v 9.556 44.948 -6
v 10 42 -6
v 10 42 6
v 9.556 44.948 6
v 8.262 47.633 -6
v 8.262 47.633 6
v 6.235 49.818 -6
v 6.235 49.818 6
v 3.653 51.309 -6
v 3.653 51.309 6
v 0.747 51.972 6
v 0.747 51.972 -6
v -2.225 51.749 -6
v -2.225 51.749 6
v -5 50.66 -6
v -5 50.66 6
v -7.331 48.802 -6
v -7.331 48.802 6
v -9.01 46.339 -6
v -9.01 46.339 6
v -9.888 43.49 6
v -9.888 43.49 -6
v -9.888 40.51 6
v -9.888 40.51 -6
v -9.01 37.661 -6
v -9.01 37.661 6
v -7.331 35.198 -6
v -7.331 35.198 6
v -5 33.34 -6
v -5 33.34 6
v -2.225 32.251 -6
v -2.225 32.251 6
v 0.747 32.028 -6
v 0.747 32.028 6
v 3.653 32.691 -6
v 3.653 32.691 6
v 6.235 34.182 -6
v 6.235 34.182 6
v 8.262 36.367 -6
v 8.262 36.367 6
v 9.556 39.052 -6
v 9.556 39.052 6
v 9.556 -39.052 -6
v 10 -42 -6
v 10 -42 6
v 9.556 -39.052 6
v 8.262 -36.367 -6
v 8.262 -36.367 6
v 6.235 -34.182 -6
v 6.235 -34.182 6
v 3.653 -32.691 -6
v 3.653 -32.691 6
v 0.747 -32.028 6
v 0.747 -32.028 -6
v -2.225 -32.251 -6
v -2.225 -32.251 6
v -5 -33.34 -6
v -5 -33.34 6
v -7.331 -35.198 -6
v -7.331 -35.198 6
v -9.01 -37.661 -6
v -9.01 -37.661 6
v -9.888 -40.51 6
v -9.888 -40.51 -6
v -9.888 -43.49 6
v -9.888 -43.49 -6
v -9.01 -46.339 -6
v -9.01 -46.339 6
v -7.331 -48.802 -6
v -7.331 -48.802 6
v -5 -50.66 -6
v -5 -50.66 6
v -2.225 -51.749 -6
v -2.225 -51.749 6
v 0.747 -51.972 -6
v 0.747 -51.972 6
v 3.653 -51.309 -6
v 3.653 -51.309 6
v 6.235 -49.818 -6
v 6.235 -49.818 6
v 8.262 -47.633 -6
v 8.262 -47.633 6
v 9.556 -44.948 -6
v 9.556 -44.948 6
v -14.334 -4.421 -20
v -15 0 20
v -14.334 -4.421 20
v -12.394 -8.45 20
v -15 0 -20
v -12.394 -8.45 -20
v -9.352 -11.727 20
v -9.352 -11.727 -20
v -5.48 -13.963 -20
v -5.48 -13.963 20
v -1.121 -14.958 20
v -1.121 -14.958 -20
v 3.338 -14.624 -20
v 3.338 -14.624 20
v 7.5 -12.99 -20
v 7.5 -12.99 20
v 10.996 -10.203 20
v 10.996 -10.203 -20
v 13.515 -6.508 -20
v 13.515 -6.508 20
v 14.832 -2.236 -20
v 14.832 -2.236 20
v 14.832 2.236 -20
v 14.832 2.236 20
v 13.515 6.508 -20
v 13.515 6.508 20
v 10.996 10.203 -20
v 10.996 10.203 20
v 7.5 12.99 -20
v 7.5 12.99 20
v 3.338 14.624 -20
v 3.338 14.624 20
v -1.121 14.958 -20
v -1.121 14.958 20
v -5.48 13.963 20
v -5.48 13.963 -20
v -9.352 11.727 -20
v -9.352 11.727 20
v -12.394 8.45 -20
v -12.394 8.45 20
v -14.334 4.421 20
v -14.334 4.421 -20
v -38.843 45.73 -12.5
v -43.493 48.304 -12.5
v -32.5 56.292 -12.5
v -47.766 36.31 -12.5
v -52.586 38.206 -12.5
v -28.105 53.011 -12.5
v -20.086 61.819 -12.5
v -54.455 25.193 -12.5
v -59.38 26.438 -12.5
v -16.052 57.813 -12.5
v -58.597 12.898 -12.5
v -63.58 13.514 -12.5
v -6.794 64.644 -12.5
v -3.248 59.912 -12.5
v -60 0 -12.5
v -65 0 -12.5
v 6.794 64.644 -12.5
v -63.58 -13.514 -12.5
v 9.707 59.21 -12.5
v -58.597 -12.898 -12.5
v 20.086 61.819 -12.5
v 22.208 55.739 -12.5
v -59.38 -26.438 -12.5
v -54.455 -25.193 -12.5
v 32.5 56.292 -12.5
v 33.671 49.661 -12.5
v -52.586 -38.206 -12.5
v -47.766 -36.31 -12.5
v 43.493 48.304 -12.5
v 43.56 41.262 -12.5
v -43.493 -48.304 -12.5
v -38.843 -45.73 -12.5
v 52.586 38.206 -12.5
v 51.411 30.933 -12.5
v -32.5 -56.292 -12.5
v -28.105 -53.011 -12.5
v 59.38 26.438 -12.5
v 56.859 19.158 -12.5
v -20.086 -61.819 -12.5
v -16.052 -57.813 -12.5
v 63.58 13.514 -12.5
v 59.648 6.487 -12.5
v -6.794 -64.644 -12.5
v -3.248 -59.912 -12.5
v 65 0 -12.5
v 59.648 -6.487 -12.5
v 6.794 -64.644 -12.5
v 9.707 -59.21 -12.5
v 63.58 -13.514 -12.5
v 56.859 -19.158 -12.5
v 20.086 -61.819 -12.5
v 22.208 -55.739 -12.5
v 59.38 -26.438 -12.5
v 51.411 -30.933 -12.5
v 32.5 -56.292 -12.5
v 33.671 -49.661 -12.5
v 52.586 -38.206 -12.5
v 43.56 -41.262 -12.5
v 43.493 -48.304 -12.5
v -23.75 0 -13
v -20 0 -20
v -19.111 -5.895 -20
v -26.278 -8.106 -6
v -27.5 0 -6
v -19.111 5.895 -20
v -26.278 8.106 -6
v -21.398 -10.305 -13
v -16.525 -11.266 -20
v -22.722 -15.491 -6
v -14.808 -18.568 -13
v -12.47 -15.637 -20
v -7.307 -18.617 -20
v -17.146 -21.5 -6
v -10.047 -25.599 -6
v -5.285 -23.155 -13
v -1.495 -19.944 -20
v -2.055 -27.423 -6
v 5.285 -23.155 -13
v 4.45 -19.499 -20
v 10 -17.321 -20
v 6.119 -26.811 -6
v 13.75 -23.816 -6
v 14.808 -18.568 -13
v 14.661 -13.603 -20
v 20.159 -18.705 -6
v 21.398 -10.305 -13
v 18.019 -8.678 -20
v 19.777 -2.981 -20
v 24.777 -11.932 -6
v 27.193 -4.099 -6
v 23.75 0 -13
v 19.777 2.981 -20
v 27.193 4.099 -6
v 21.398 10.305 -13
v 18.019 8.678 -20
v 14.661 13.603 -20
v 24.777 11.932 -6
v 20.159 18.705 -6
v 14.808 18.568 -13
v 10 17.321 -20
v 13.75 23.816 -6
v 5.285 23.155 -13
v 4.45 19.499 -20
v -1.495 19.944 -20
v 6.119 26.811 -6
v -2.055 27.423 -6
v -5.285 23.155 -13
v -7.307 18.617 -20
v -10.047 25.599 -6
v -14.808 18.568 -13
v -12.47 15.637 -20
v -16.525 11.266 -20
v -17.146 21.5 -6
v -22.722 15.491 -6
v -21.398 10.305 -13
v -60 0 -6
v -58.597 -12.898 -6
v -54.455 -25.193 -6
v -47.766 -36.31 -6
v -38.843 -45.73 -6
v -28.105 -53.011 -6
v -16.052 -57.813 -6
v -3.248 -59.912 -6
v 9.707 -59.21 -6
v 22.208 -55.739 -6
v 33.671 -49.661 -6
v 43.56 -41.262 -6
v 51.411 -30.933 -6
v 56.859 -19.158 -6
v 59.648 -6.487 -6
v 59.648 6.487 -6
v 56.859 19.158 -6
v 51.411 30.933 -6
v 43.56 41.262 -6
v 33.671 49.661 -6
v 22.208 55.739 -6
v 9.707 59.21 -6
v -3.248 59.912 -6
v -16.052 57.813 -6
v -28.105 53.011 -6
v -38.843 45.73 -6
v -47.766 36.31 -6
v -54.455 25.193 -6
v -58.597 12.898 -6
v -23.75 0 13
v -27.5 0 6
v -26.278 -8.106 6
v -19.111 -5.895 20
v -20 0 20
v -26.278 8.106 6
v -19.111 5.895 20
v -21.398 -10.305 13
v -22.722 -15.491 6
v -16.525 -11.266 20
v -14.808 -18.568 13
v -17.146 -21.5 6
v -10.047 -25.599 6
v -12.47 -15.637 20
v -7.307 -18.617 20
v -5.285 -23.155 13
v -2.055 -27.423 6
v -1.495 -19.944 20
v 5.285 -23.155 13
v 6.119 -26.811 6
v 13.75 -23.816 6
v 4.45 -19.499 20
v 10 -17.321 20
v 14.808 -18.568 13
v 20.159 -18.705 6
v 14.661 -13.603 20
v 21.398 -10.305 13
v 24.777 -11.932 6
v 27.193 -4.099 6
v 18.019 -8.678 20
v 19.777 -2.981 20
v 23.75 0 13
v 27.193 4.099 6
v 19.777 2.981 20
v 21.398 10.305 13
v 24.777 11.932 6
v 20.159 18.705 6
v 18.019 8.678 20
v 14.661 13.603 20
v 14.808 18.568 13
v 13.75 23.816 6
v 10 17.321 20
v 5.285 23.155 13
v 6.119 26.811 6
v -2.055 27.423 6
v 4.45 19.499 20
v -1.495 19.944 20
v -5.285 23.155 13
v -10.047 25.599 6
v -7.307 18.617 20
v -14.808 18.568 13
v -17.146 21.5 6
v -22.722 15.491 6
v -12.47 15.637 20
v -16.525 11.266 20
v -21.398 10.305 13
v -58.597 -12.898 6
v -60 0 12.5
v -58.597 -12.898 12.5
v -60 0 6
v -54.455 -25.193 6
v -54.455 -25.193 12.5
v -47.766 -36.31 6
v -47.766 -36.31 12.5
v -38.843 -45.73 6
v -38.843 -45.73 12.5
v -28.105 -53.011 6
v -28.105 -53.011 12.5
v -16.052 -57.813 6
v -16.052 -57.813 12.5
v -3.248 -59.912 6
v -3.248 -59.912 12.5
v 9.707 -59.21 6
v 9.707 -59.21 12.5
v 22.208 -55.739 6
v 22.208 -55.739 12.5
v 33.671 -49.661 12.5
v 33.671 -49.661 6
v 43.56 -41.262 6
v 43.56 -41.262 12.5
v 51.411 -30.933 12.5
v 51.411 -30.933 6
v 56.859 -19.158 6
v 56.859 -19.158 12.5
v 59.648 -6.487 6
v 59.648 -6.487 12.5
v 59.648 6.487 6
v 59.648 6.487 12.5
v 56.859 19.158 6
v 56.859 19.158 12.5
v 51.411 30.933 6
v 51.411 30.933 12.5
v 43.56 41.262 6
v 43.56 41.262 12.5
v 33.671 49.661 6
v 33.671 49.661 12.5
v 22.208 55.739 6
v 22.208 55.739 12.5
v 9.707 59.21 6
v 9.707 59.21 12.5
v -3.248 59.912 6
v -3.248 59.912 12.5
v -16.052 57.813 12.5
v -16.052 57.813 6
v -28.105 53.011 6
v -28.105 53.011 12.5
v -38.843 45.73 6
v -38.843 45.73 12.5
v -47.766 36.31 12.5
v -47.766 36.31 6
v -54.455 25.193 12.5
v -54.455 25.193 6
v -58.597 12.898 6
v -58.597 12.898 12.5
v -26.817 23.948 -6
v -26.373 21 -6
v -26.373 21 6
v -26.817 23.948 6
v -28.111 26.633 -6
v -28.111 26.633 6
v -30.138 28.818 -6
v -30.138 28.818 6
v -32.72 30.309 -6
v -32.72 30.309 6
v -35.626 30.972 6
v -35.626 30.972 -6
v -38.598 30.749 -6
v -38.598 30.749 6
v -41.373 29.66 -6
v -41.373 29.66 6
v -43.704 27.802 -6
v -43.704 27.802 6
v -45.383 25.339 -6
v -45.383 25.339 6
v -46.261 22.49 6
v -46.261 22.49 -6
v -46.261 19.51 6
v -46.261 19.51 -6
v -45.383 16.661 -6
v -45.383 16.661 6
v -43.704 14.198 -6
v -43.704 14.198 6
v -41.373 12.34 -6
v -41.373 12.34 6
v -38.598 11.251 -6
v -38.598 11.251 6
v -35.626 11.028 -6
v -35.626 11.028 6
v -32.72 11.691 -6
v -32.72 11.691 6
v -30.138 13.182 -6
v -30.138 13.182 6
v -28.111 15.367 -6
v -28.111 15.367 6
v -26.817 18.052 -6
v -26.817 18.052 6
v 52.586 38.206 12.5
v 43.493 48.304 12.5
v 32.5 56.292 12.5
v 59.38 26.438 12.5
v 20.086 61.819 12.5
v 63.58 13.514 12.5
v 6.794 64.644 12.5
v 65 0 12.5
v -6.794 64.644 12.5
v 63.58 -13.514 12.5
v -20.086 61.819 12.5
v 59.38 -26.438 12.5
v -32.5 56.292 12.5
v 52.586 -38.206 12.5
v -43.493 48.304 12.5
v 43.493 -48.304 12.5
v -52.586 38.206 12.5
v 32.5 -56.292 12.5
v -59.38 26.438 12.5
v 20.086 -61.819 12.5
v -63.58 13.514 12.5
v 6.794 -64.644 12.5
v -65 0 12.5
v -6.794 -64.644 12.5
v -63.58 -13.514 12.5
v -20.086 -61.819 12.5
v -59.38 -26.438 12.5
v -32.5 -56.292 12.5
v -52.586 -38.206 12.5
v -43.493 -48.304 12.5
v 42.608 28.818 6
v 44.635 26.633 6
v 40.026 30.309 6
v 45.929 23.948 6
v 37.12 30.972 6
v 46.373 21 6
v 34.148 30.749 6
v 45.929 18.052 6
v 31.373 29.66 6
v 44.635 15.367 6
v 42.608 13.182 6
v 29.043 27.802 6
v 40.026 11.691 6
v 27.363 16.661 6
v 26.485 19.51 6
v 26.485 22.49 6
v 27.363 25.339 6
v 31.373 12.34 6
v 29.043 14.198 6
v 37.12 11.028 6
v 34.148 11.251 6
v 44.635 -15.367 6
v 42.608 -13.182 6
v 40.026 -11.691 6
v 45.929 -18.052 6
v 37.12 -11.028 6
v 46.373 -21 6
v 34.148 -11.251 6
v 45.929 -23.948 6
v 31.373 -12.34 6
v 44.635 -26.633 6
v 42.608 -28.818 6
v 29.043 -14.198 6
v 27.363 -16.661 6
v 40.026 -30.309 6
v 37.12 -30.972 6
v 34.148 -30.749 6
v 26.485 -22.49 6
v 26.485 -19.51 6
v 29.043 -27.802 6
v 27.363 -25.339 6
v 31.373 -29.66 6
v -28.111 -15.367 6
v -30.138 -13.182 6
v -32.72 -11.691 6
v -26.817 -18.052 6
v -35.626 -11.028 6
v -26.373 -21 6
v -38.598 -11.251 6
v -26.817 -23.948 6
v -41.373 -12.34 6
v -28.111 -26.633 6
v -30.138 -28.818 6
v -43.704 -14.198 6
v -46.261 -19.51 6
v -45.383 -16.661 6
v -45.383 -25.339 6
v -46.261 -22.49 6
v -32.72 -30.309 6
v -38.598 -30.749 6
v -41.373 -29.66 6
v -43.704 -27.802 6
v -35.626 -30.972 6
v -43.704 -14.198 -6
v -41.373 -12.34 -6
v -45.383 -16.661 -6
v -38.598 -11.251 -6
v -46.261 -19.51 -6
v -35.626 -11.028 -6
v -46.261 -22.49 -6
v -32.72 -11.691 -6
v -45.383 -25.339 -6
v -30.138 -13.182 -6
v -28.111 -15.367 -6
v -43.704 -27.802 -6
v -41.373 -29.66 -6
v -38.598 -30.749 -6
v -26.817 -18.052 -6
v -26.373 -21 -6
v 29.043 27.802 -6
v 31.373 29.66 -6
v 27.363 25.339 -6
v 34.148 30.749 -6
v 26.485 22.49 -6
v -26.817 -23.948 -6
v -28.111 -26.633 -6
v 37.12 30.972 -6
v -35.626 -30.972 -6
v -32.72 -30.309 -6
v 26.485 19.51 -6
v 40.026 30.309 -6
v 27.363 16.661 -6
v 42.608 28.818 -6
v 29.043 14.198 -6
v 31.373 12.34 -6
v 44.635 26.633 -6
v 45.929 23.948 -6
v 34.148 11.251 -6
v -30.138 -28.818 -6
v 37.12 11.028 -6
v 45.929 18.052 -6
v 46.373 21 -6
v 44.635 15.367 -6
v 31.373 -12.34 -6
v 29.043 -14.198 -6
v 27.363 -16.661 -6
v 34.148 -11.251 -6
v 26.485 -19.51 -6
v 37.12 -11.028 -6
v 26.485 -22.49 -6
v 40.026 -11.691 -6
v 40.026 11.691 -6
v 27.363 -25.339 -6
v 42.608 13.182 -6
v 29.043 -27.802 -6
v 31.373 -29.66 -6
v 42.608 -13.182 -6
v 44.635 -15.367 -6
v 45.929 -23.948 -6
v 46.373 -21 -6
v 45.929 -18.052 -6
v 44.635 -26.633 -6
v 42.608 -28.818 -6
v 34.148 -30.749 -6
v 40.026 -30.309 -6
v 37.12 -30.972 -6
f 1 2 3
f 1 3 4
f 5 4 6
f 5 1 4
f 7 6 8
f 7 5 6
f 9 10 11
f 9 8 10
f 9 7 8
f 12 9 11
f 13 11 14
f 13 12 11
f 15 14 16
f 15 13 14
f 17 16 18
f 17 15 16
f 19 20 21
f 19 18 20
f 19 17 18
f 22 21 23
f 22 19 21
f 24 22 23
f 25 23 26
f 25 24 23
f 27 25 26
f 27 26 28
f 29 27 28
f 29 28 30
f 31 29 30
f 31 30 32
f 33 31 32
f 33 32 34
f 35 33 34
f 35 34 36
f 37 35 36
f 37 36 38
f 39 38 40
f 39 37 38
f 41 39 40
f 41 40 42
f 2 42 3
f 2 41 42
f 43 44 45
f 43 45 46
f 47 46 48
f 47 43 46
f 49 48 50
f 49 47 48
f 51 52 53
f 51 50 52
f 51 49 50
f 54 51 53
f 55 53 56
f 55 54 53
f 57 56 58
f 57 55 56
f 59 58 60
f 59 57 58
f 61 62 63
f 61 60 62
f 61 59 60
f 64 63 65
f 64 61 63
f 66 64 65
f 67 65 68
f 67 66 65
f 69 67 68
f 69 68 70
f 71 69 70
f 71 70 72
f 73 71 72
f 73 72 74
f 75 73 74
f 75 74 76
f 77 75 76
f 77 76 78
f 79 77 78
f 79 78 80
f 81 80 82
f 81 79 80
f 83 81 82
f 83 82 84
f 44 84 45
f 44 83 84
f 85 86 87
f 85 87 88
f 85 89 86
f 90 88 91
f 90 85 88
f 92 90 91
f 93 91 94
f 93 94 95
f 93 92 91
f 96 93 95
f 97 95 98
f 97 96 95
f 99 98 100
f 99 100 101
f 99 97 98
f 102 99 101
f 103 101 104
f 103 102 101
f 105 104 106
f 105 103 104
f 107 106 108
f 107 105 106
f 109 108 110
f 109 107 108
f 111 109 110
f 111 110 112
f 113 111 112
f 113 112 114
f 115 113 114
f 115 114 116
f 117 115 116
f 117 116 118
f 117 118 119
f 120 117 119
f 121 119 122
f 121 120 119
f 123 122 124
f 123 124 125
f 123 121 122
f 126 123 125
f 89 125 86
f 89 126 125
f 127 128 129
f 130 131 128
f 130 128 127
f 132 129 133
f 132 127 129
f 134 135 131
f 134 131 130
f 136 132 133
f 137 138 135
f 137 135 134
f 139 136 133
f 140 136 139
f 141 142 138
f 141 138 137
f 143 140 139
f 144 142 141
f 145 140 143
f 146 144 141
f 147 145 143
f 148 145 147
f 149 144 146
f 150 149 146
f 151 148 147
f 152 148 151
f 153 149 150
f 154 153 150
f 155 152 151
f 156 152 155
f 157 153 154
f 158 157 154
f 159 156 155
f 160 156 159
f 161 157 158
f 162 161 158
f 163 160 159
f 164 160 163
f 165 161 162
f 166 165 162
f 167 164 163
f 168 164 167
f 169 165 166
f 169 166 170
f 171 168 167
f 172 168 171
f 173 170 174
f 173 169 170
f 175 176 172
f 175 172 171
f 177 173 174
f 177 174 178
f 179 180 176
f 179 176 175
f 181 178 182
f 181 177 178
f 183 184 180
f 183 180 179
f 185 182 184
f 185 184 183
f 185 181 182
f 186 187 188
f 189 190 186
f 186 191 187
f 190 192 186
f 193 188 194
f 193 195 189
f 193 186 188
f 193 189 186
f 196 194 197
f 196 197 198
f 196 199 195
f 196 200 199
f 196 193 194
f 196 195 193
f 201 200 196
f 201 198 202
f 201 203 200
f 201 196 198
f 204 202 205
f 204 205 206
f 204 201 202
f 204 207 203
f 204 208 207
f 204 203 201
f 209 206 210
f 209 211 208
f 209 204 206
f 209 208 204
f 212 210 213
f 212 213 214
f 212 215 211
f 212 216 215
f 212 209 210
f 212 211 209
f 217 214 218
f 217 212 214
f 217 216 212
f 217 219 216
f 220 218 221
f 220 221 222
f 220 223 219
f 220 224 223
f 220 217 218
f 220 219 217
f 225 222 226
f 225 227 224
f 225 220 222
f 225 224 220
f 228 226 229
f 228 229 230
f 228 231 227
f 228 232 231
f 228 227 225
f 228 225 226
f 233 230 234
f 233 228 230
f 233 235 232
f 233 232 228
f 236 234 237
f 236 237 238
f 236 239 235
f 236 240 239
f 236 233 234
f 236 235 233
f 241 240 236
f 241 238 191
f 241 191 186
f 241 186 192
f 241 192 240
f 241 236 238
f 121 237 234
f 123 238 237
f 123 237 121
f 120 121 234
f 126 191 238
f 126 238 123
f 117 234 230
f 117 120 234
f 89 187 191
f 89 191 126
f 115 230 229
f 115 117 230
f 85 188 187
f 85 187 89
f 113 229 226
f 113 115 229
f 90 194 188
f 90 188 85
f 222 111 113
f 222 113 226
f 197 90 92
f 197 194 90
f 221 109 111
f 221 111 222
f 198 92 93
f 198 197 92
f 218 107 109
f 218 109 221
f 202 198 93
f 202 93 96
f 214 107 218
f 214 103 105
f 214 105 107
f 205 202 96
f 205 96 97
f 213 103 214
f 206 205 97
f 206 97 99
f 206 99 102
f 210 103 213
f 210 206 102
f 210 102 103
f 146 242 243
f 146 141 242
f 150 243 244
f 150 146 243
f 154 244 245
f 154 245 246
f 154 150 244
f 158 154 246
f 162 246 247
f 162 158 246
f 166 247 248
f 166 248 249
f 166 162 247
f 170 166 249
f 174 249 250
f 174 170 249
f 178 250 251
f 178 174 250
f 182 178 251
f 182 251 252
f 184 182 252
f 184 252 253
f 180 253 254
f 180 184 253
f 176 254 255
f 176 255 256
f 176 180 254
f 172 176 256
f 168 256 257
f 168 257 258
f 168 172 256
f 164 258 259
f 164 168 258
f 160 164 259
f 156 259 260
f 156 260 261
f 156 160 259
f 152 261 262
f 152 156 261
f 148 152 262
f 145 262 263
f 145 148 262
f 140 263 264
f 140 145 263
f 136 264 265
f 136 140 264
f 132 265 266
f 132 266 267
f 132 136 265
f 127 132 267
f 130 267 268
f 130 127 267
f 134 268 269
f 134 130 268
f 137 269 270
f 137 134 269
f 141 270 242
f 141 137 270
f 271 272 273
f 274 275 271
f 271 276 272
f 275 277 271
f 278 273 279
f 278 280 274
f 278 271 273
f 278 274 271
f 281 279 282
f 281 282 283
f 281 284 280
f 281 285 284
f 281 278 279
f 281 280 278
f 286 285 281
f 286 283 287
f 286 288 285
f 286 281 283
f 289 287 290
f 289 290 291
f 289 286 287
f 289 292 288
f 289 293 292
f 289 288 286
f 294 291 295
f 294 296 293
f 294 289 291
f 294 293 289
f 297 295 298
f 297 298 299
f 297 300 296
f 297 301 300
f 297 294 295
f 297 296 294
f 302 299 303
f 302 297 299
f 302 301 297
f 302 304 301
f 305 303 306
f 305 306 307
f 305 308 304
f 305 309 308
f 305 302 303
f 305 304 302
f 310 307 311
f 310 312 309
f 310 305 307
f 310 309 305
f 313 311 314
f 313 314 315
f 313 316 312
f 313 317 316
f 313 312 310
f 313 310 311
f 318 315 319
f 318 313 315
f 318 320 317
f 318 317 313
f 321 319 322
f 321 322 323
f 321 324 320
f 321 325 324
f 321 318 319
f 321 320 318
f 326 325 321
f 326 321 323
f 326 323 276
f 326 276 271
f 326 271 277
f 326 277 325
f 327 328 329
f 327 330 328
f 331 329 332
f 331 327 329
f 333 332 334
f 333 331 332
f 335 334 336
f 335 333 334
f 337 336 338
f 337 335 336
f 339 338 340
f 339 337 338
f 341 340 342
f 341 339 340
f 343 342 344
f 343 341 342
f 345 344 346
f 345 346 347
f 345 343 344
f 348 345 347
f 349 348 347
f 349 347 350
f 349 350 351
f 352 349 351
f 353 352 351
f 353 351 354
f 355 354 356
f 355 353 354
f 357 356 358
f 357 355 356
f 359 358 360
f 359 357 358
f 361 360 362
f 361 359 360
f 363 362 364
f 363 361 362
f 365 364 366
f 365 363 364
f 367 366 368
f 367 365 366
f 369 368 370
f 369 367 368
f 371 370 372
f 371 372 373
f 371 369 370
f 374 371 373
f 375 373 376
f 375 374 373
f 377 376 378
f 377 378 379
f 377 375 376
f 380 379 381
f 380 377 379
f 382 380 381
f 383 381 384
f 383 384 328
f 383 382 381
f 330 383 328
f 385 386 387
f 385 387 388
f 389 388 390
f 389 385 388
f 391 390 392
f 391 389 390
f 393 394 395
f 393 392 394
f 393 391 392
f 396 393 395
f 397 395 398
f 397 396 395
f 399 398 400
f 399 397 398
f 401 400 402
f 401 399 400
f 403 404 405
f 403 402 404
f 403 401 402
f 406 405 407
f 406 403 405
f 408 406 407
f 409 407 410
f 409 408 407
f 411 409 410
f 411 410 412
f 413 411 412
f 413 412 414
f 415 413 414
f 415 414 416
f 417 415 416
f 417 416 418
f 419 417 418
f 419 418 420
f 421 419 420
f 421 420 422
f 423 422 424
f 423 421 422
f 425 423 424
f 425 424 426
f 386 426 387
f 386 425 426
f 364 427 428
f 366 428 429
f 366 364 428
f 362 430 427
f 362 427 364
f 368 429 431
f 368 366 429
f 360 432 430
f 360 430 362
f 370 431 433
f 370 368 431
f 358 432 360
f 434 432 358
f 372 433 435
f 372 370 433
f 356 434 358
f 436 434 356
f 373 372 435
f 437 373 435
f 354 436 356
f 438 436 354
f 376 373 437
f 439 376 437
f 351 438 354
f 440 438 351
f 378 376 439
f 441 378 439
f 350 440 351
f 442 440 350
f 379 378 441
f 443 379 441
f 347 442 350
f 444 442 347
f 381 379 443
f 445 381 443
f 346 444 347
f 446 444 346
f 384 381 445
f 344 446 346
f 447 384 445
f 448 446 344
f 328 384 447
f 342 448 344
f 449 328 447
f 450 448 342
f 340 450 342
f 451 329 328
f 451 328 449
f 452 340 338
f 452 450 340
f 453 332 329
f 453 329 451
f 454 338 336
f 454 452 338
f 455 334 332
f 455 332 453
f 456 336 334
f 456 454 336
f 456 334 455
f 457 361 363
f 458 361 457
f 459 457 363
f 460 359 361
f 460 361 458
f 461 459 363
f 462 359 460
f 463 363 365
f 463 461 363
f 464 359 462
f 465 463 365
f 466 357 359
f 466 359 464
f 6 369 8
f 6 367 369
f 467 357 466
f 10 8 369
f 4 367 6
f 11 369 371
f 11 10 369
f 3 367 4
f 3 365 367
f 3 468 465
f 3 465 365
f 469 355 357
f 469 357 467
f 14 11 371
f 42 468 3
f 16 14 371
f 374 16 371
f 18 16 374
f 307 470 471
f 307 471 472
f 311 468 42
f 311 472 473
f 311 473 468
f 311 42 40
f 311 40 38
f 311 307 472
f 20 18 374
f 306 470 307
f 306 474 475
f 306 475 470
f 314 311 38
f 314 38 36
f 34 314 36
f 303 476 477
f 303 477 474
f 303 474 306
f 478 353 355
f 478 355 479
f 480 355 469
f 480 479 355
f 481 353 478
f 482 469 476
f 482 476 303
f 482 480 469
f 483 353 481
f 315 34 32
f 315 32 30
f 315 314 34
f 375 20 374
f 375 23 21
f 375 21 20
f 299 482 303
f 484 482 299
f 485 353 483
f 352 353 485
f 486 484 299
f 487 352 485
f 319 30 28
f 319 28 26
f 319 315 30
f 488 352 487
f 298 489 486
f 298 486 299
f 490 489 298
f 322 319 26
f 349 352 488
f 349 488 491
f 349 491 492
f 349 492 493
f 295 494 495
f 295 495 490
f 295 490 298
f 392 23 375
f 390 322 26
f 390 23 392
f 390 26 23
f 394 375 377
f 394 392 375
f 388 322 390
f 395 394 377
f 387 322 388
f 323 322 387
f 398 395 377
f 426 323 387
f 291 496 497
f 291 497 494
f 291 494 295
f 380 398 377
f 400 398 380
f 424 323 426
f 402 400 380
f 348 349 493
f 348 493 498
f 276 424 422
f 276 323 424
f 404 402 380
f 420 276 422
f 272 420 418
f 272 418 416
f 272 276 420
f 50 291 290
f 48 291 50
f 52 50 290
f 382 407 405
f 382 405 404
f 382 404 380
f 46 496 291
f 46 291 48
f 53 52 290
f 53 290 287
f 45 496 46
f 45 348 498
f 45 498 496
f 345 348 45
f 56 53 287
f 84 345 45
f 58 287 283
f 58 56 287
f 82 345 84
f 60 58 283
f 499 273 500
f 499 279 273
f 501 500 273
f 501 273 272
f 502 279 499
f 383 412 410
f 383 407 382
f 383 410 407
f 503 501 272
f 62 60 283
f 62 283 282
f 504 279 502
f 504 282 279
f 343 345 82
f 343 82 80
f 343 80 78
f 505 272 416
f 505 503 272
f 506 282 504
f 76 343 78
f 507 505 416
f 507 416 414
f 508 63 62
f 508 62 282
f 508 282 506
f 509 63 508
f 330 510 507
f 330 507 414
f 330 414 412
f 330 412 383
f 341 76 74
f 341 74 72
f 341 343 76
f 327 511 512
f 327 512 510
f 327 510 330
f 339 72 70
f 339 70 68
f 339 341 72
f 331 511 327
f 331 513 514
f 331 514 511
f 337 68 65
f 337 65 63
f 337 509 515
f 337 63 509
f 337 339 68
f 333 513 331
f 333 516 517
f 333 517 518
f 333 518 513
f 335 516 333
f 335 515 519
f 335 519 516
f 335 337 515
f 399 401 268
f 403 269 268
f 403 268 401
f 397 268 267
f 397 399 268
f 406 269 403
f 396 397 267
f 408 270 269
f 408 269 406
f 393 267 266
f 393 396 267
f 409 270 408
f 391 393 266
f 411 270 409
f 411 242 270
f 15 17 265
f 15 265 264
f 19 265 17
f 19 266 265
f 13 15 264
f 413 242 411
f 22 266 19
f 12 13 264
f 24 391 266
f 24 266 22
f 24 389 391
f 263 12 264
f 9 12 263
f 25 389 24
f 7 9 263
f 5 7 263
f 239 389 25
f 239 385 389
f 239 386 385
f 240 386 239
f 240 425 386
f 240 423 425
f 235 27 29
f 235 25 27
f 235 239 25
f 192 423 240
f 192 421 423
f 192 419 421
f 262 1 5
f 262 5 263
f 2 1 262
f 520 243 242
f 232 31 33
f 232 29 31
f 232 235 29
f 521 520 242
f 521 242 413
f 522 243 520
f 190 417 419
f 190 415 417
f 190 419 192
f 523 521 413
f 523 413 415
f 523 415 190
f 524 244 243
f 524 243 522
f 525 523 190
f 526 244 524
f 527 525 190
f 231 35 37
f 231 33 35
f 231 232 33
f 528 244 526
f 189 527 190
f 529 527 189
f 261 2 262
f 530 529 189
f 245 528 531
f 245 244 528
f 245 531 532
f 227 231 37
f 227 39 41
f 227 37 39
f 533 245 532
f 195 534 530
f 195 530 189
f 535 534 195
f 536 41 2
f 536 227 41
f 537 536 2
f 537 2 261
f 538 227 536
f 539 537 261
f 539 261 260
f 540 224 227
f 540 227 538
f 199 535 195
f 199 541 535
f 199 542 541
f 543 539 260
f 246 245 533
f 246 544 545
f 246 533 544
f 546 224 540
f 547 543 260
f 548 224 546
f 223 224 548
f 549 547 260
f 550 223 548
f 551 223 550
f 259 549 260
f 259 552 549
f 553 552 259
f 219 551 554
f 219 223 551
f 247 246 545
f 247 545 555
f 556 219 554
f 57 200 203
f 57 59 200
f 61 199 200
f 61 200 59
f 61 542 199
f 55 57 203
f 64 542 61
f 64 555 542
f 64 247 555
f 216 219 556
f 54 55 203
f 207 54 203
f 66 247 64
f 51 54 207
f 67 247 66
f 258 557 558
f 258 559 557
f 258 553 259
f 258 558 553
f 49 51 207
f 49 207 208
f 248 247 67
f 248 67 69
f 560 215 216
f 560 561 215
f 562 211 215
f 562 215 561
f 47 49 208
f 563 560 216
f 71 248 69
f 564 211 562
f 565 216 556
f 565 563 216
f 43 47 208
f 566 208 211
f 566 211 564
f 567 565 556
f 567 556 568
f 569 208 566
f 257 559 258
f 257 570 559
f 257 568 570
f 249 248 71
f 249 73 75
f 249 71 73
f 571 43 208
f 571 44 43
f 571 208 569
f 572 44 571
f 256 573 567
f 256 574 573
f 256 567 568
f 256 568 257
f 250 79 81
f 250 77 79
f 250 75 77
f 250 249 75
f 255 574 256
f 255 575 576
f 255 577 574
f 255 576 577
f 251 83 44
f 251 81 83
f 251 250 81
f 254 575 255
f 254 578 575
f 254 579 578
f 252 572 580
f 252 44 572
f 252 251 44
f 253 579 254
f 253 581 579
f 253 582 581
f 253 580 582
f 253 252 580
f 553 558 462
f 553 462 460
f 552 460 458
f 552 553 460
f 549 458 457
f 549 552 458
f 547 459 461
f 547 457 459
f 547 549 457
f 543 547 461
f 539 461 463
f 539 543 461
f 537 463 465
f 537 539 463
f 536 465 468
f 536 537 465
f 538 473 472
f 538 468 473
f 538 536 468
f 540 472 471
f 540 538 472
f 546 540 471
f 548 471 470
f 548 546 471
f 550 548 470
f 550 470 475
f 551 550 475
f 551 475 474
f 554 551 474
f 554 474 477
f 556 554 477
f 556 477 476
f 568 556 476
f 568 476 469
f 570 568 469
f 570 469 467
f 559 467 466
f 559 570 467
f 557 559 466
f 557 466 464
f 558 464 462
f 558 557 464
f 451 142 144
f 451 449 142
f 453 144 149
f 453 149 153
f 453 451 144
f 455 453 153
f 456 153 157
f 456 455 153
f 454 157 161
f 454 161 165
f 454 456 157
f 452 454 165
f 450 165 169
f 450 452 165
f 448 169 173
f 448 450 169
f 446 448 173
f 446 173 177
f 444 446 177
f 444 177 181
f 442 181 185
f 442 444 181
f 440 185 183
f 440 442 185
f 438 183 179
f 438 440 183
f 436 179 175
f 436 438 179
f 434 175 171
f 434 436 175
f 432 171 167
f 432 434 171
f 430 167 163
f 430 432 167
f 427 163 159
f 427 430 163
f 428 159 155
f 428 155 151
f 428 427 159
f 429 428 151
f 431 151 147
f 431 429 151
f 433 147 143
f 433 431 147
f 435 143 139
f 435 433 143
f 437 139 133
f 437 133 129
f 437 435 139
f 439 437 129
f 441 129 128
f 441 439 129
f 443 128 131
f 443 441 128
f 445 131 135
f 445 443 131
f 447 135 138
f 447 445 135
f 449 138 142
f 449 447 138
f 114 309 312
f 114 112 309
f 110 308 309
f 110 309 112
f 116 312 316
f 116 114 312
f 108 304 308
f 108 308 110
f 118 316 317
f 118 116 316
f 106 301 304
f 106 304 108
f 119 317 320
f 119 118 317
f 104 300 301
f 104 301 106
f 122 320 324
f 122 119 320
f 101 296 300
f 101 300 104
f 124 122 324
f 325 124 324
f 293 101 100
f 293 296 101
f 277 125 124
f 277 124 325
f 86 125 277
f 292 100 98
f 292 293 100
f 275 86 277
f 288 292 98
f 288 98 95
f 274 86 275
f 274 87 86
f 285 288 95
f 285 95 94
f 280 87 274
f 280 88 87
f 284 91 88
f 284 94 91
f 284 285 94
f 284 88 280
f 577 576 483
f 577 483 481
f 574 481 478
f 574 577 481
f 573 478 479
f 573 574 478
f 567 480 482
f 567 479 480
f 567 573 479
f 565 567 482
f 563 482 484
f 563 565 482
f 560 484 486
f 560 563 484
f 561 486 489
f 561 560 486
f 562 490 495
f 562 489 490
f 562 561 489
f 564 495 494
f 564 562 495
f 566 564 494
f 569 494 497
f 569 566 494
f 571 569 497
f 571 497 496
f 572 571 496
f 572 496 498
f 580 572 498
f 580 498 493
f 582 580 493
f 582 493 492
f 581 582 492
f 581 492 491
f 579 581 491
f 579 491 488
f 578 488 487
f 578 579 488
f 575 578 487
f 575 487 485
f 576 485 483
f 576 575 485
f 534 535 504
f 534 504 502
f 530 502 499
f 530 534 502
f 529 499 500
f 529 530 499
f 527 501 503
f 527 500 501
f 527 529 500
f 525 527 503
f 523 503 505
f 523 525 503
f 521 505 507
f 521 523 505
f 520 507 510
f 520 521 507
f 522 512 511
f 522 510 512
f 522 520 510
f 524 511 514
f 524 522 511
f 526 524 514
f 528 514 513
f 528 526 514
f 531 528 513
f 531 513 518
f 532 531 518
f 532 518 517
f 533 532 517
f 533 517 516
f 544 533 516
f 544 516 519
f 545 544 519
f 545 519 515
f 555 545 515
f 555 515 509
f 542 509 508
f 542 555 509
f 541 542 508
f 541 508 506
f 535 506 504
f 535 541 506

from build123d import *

# Parameters (mm, degrees)
CUT_EXTRUDE1_DEPTH      = 96.530099969
CUT_EXTRUDE1_DEPTH_BACK = 96.530099969
SKETCH2_R               = 10


with BuildPart() as part:
    # Sketch1 → Revolve1 (revolve)
    with BuildSketch(Plane(origin=(0, 0, 0), x_dir=(0, 0, -1), z_dir=(1, 0, 0)), mode=Mode.PRIVATE) as revolve1_sk:
        Polygon((12.5, 65), (-12.5, 65), (-12.5, 60), (-6, 60), (-6, 41.964344451), (-6, 27.5), (-20, 20), (-20, 15), (20, 15), (20, 20), (6, 27.5), (6, 41.964344451), (6, 60), (12.5, 60), align=None)
    revolve(revolve1_sk.sketch.rotate(Axis((0, 0, -27.705838771), (0, 0, 1)), 90), axis=Axis((0, 0, -27.705838771), (0, 0, 1)))

    # Sketch2 → Cut-Extrude1 (cut, two sides: drawn at the far end of the back side and taken through both)
    with BuildSketch(Plane.XY.offset(6).offset(-CUT_EXTRUDE1_DEPTH_BACK)):
        with Locations((0, 42)):
            Circle(SKETCH2_R)
        with Locations((36.373066959, 21)):
            Circle(SKETCH2_R)
        with Locations((36.373066959, -21)):
            Circle(SKETCH2_R)
        with Locations((0, -42)):
            Circle(SKETCH2_R)
        with Locations((-36.373066959, -21)):
            Circle(SKETCH2_R)
        with Locations((-36.373066959, 21)):
            Circle(SKETCH2_R)
    extrude(amount=CUT_EXTRUDE1_DEPTH + CUT_EXTRUDE1_DEPTH_BACK, mode=Mode.SUBTRACT)


solid = part.part
